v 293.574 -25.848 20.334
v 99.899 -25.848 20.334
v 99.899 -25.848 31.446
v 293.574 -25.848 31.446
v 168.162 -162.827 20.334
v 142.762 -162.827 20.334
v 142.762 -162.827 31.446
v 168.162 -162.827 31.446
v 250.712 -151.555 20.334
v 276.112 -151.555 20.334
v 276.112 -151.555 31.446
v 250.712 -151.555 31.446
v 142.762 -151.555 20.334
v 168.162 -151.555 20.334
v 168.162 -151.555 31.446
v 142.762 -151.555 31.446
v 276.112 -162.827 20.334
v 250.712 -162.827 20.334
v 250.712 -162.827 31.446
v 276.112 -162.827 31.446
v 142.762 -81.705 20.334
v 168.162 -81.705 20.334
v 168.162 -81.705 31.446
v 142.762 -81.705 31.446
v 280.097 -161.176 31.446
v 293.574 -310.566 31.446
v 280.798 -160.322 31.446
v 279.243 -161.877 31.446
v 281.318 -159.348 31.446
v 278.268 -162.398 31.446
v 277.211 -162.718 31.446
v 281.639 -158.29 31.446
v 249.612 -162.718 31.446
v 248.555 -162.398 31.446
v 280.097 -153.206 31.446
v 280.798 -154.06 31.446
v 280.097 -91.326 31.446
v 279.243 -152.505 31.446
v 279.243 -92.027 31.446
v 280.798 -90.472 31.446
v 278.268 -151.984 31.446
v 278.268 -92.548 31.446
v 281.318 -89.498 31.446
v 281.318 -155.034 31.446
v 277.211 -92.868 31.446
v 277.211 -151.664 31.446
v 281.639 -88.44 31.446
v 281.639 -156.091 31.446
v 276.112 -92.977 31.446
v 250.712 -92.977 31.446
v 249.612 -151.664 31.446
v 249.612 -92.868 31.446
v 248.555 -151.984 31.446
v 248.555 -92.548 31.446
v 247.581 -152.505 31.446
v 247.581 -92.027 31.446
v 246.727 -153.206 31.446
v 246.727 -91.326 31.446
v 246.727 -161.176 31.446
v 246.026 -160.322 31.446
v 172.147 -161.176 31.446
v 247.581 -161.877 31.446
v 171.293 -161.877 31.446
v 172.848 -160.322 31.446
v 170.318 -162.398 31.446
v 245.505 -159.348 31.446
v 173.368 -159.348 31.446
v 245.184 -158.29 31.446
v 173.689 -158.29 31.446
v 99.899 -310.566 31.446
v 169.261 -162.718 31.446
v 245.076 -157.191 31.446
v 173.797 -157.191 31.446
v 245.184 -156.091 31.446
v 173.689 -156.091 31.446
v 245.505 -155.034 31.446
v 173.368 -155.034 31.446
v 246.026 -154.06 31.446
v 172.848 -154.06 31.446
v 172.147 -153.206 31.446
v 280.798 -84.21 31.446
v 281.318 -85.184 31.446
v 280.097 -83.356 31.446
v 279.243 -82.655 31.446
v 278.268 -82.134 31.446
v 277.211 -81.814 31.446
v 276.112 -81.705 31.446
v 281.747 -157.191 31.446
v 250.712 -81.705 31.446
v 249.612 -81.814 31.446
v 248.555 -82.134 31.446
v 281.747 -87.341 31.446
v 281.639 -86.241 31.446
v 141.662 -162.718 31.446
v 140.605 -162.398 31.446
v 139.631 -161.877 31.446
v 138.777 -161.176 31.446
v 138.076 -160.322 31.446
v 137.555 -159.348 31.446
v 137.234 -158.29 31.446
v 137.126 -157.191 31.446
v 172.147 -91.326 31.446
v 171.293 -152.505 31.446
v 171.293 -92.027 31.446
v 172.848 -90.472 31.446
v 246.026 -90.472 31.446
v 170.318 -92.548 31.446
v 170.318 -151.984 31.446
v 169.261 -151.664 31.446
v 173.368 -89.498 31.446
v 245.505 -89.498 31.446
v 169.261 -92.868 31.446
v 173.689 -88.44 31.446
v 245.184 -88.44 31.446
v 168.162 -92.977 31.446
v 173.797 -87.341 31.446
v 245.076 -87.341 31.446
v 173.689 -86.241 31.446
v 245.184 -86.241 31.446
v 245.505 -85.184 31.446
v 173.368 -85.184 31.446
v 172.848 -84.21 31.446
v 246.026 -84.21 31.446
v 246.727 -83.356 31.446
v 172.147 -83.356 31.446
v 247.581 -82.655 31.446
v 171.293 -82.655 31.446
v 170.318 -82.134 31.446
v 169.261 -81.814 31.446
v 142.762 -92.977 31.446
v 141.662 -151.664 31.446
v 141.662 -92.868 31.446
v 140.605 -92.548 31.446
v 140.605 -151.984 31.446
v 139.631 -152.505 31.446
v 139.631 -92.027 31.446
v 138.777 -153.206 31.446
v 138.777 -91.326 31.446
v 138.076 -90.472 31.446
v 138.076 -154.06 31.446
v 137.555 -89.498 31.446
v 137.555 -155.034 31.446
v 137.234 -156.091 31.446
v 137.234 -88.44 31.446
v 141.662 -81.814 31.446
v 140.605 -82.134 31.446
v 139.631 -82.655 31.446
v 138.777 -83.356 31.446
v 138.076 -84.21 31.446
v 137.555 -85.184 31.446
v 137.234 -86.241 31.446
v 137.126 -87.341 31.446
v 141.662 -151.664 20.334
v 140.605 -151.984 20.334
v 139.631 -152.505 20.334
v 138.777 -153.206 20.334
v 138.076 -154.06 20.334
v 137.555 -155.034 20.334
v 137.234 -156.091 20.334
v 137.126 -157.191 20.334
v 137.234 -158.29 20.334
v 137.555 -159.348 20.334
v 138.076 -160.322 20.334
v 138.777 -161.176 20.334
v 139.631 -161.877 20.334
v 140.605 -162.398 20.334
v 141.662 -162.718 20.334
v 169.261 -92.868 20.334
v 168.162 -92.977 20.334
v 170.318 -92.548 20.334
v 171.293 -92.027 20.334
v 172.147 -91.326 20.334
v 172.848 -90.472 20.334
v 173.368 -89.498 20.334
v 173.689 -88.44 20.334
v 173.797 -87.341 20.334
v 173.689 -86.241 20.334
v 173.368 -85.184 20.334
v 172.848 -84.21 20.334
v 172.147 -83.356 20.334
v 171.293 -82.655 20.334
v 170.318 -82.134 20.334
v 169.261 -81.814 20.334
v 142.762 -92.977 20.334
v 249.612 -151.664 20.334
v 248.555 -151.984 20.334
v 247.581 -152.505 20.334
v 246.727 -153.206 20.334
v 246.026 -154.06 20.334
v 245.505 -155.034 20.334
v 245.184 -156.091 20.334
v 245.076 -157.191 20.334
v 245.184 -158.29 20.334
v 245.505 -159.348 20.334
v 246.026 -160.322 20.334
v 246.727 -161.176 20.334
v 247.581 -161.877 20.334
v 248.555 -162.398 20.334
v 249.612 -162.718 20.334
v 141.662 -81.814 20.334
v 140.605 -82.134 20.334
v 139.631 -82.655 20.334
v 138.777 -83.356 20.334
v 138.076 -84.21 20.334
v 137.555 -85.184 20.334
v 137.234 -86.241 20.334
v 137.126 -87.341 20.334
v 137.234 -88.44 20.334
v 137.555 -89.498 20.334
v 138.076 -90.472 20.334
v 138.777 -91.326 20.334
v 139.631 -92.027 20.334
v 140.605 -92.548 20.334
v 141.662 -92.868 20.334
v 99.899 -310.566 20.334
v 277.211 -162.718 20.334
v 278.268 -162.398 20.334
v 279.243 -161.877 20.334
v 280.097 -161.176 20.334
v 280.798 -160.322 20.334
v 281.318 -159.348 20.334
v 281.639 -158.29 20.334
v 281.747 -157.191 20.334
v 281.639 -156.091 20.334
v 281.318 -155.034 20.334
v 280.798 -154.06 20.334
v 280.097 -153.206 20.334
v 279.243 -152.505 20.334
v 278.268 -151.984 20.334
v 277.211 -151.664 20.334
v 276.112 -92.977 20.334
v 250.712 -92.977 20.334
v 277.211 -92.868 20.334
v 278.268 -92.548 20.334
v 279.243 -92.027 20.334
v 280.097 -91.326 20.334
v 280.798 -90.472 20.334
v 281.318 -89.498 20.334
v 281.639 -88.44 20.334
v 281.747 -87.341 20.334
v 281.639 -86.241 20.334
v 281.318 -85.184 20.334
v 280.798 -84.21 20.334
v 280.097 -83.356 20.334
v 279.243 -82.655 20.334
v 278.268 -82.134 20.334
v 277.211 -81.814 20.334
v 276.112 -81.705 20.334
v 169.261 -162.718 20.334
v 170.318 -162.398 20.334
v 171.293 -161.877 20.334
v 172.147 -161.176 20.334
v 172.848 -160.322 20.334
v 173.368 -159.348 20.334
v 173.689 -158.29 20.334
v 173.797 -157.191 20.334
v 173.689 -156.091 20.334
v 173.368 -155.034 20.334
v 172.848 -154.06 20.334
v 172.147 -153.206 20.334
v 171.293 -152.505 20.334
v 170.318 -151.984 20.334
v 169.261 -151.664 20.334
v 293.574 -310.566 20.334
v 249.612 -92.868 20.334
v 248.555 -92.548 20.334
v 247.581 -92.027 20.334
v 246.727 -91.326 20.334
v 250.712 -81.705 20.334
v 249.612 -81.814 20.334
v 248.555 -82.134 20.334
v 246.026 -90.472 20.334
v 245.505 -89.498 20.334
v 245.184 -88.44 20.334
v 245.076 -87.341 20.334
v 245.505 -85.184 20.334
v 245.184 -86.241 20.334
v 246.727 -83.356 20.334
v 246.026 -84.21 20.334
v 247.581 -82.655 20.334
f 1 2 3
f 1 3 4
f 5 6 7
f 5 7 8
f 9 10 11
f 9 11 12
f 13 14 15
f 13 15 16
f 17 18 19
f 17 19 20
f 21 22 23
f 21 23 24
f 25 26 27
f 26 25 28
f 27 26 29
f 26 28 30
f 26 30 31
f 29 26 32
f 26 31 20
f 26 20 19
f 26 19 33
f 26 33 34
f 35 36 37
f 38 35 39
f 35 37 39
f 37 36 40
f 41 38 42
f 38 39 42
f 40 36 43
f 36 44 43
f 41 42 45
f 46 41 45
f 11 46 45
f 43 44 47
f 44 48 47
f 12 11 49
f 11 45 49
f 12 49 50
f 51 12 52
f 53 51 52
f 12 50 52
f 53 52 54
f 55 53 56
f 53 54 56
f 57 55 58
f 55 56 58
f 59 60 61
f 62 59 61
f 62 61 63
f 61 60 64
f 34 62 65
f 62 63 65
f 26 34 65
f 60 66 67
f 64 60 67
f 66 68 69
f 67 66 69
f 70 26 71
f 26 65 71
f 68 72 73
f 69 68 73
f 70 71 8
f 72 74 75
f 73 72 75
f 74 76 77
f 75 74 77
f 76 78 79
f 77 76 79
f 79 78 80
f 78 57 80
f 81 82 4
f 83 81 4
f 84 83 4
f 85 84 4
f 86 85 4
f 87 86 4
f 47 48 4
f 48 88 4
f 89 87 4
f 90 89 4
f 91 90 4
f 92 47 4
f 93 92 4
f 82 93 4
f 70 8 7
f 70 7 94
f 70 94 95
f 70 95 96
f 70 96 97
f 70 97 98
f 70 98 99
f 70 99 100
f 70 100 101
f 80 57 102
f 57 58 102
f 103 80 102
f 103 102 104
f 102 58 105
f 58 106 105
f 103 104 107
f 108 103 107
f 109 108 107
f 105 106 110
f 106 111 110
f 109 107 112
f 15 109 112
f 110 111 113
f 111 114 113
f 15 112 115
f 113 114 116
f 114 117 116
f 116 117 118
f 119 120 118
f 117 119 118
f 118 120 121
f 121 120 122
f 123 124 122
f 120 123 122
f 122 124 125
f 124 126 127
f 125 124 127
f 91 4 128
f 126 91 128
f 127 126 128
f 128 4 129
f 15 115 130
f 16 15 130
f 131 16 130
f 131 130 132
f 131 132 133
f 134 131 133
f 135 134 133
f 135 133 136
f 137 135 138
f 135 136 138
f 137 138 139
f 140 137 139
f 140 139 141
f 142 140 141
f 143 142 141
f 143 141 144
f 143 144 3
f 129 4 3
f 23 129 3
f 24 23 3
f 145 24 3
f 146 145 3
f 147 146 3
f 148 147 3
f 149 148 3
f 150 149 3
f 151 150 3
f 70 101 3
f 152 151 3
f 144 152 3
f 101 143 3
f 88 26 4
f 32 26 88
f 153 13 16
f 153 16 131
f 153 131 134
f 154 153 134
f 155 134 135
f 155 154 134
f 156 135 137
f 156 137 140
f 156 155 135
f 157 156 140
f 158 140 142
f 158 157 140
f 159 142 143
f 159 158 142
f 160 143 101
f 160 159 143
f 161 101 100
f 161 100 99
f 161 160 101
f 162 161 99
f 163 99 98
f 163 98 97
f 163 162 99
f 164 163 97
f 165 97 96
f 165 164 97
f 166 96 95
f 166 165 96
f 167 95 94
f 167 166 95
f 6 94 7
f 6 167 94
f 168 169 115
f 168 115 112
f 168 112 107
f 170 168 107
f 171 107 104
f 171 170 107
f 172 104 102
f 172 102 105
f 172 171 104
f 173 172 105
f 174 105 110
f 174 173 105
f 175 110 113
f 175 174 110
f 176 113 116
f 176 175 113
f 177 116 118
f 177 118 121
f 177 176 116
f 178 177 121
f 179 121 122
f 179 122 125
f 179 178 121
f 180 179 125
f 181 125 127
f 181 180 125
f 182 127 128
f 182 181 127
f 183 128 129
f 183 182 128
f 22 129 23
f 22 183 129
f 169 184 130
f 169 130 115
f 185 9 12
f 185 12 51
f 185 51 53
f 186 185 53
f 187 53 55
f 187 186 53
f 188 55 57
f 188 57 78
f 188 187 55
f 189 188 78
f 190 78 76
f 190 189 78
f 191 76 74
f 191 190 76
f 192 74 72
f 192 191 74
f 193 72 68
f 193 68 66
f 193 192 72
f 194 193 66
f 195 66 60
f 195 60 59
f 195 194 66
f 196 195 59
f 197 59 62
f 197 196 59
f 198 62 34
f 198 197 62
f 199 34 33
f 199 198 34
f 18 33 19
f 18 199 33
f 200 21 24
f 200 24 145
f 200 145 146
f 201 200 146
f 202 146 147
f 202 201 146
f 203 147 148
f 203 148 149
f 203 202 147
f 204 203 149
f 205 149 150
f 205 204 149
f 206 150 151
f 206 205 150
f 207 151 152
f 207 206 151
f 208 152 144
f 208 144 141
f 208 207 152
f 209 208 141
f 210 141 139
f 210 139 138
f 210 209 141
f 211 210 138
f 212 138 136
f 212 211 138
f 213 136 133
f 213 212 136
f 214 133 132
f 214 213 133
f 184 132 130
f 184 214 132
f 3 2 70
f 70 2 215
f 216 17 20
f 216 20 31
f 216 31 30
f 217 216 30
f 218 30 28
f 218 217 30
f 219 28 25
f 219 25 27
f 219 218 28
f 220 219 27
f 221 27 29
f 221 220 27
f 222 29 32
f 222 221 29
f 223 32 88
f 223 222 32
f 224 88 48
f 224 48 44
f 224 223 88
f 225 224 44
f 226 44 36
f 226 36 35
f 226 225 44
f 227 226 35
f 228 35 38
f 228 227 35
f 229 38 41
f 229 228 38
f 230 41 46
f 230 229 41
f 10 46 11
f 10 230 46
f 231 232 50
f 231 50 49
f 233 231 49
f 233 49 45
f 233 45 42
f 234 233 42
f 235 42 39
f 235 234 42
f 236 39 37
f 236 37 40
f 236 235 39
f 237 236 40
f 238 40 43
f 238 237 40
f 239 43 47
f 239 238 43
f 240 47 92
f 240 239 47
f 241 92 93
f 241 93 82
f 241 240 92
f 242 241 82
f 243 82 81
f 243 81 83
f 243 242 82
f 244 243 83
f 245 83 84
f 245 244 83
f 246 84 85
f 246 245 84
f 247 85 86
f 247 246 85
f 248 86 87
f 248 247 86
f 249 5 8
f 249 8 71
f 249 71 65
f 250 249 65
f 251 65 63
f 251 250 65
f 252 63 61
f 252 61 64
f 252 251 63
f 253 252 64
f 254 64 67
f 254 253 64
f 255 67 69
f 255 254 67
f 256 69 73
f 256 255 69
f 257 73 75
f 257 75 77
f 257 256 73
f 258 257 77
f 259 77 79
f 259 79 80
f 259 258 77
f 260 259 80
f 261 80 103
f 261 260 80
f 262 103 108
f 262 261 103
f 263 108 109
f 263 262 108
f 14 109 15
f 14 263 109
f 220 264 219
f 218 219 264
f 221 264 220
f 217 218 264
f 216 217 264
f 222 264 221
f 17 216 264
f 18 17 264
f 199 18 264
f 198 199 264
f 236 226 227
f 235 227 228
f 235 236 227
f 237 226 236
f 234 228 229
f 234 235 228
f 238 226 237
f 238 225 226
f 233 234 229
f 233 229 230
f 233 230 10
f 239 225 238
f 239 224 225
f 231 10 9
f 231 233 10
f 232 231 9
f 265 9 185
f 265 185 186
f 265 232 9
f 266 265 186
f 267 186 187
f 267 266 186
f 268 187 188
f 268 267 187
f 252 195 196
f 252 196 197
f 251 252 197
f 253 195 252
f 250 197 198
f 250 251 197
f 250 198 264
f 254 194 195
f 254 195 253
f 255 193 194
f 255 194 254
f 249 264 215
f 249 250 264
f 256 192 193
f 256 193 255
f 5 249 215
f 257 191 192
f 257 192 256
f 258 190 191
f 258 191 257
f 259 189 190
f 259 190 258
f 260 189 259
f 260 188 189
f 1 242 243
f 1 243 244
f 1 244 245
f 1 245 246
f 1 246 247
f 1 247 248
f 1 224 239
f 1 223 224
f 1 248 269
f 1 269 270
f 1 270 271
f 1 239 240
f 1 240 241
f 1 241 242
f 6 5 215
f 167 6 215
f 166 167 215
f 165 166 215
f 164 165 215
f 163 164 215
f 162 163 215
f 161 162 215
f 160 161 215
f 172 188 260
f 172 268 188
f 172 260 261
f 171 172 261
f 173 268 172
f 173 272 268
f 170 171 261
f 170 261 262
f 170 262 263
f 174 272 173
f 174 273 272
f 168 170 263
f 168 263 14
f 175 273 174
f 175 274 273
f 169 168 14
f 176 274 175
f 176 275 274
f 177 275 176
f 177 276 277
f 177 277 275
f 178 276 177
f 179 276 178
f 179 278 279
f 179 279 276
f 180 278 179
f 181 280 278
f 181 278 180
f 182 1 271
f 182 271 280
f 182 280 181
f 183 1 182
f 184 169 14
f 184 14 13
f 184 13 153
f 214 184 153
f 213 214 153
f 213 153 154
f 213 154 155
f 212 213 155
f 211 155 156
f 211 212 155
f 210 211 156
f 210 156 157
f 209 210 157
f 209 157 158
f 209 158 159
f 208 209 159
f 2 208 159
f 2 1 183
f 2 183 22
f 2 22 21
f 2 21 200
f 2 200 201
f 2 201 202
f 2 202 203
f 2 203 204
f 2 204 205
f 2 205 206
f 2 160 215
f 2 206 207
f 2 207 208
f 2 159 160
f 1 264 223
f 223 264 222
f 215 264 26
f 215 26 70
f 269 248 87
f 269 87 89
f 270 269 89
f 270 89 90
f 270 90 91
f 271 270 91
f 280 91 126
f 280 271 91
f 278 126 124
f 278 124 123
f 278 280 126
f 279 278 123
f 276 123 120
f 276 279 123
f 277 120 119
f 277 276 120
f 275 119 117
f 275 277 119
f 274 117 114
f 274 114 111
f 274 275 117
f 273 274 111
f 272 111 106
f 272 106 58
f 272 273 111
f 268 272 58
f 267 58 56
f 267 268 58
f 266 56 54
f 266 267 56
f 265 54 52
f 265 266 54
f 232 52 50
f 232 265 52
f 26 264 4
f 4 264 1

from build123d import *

# Parameters (mm, degrees)
BOSS_EXTRUDE1_START = 20.333687
BOSS_EXTRUDE1_DEPTH = 11.1125


with BuildPart() as part:
    # Sketch1 → Boss-Extrude1 (new body)
    with BuildSketch(Plane.XY.offset(BOSS_EXTRUDE1_START)):
        Polygon((293.574186737, -297.8658), (293.574186737, -310.5658), (99.899186737, -310.5658), (99.899186737, -297.8658), (99.899186737, -25.8475), (293.574186737, -25.8475), align=None)
        with BuildLine():
            ThreePointArc((250.711686737, -151.555275), (245.076061737, -157.1909), (250.711686737, -162.826525))
            Line((250.711686737, -162.826525), (276.111686737, -162.826525))
            ThreePointArc((276.111686737, -162.826525), (281.747311737, -157.1909), (276.111686737, -151.555275))
            Line((276.111686737, -151.555275), (250.711686737, -151.555275))
        make_face(mode=Mode.SUBTRACT)
        with BuildLine():
            ThreePointArc((250.711686737, -81.705275), (245.076061737, -87.3409), (250.711686737, -92.976525))
            Line((250.711686737, -92.976525), (276.111686737, -92.976525))
            ThreePointArc((276.111686737, -92.976525), (281.747311737, -87.3409), (276.111686737, -81.705275))
            Line((276.111686737, -81.705275), (250.711686737, -81.705275))
        make_face(mode=Mode.SUBTRACT)
        with BuildLine():
            ThreePointArc((168.161686737, -92.976525), (173.797311737, -87.3409), (168.161686737, -81.705275))
            Line((168.161686737, -81.705275), (142.761686737, -81.705275))
            ThreePointArc((142.761686737, -81.705275), (137.126061737, -87.3409), (142.761686737, -92.976525))
            Line((142.761686737, -92.976525), (168.161686737, -92.976525))
        make_face(mode=Mode.SUBTRACT)
        with BuildLine():
            ThreePointArc((142.761686737, -151.555275), (137.126061737, -157.1909), (142.761686737, -162.826525))
            Line((142.761686737, -162.826525), (168.161686737, -162.826525))
            ThreePointArc((168.161686737, -162.826525), (173.797311737, -157.1909), (168.161686737, -151.555275))
            Line((168.161686737, -151.555275), (142.761686737, -151.555275))
        make_face(mode=Mode.SUBTRACT)
    extrude(amount=BOSS_EXTRUDE1_DEPTH)


solid = part.part
